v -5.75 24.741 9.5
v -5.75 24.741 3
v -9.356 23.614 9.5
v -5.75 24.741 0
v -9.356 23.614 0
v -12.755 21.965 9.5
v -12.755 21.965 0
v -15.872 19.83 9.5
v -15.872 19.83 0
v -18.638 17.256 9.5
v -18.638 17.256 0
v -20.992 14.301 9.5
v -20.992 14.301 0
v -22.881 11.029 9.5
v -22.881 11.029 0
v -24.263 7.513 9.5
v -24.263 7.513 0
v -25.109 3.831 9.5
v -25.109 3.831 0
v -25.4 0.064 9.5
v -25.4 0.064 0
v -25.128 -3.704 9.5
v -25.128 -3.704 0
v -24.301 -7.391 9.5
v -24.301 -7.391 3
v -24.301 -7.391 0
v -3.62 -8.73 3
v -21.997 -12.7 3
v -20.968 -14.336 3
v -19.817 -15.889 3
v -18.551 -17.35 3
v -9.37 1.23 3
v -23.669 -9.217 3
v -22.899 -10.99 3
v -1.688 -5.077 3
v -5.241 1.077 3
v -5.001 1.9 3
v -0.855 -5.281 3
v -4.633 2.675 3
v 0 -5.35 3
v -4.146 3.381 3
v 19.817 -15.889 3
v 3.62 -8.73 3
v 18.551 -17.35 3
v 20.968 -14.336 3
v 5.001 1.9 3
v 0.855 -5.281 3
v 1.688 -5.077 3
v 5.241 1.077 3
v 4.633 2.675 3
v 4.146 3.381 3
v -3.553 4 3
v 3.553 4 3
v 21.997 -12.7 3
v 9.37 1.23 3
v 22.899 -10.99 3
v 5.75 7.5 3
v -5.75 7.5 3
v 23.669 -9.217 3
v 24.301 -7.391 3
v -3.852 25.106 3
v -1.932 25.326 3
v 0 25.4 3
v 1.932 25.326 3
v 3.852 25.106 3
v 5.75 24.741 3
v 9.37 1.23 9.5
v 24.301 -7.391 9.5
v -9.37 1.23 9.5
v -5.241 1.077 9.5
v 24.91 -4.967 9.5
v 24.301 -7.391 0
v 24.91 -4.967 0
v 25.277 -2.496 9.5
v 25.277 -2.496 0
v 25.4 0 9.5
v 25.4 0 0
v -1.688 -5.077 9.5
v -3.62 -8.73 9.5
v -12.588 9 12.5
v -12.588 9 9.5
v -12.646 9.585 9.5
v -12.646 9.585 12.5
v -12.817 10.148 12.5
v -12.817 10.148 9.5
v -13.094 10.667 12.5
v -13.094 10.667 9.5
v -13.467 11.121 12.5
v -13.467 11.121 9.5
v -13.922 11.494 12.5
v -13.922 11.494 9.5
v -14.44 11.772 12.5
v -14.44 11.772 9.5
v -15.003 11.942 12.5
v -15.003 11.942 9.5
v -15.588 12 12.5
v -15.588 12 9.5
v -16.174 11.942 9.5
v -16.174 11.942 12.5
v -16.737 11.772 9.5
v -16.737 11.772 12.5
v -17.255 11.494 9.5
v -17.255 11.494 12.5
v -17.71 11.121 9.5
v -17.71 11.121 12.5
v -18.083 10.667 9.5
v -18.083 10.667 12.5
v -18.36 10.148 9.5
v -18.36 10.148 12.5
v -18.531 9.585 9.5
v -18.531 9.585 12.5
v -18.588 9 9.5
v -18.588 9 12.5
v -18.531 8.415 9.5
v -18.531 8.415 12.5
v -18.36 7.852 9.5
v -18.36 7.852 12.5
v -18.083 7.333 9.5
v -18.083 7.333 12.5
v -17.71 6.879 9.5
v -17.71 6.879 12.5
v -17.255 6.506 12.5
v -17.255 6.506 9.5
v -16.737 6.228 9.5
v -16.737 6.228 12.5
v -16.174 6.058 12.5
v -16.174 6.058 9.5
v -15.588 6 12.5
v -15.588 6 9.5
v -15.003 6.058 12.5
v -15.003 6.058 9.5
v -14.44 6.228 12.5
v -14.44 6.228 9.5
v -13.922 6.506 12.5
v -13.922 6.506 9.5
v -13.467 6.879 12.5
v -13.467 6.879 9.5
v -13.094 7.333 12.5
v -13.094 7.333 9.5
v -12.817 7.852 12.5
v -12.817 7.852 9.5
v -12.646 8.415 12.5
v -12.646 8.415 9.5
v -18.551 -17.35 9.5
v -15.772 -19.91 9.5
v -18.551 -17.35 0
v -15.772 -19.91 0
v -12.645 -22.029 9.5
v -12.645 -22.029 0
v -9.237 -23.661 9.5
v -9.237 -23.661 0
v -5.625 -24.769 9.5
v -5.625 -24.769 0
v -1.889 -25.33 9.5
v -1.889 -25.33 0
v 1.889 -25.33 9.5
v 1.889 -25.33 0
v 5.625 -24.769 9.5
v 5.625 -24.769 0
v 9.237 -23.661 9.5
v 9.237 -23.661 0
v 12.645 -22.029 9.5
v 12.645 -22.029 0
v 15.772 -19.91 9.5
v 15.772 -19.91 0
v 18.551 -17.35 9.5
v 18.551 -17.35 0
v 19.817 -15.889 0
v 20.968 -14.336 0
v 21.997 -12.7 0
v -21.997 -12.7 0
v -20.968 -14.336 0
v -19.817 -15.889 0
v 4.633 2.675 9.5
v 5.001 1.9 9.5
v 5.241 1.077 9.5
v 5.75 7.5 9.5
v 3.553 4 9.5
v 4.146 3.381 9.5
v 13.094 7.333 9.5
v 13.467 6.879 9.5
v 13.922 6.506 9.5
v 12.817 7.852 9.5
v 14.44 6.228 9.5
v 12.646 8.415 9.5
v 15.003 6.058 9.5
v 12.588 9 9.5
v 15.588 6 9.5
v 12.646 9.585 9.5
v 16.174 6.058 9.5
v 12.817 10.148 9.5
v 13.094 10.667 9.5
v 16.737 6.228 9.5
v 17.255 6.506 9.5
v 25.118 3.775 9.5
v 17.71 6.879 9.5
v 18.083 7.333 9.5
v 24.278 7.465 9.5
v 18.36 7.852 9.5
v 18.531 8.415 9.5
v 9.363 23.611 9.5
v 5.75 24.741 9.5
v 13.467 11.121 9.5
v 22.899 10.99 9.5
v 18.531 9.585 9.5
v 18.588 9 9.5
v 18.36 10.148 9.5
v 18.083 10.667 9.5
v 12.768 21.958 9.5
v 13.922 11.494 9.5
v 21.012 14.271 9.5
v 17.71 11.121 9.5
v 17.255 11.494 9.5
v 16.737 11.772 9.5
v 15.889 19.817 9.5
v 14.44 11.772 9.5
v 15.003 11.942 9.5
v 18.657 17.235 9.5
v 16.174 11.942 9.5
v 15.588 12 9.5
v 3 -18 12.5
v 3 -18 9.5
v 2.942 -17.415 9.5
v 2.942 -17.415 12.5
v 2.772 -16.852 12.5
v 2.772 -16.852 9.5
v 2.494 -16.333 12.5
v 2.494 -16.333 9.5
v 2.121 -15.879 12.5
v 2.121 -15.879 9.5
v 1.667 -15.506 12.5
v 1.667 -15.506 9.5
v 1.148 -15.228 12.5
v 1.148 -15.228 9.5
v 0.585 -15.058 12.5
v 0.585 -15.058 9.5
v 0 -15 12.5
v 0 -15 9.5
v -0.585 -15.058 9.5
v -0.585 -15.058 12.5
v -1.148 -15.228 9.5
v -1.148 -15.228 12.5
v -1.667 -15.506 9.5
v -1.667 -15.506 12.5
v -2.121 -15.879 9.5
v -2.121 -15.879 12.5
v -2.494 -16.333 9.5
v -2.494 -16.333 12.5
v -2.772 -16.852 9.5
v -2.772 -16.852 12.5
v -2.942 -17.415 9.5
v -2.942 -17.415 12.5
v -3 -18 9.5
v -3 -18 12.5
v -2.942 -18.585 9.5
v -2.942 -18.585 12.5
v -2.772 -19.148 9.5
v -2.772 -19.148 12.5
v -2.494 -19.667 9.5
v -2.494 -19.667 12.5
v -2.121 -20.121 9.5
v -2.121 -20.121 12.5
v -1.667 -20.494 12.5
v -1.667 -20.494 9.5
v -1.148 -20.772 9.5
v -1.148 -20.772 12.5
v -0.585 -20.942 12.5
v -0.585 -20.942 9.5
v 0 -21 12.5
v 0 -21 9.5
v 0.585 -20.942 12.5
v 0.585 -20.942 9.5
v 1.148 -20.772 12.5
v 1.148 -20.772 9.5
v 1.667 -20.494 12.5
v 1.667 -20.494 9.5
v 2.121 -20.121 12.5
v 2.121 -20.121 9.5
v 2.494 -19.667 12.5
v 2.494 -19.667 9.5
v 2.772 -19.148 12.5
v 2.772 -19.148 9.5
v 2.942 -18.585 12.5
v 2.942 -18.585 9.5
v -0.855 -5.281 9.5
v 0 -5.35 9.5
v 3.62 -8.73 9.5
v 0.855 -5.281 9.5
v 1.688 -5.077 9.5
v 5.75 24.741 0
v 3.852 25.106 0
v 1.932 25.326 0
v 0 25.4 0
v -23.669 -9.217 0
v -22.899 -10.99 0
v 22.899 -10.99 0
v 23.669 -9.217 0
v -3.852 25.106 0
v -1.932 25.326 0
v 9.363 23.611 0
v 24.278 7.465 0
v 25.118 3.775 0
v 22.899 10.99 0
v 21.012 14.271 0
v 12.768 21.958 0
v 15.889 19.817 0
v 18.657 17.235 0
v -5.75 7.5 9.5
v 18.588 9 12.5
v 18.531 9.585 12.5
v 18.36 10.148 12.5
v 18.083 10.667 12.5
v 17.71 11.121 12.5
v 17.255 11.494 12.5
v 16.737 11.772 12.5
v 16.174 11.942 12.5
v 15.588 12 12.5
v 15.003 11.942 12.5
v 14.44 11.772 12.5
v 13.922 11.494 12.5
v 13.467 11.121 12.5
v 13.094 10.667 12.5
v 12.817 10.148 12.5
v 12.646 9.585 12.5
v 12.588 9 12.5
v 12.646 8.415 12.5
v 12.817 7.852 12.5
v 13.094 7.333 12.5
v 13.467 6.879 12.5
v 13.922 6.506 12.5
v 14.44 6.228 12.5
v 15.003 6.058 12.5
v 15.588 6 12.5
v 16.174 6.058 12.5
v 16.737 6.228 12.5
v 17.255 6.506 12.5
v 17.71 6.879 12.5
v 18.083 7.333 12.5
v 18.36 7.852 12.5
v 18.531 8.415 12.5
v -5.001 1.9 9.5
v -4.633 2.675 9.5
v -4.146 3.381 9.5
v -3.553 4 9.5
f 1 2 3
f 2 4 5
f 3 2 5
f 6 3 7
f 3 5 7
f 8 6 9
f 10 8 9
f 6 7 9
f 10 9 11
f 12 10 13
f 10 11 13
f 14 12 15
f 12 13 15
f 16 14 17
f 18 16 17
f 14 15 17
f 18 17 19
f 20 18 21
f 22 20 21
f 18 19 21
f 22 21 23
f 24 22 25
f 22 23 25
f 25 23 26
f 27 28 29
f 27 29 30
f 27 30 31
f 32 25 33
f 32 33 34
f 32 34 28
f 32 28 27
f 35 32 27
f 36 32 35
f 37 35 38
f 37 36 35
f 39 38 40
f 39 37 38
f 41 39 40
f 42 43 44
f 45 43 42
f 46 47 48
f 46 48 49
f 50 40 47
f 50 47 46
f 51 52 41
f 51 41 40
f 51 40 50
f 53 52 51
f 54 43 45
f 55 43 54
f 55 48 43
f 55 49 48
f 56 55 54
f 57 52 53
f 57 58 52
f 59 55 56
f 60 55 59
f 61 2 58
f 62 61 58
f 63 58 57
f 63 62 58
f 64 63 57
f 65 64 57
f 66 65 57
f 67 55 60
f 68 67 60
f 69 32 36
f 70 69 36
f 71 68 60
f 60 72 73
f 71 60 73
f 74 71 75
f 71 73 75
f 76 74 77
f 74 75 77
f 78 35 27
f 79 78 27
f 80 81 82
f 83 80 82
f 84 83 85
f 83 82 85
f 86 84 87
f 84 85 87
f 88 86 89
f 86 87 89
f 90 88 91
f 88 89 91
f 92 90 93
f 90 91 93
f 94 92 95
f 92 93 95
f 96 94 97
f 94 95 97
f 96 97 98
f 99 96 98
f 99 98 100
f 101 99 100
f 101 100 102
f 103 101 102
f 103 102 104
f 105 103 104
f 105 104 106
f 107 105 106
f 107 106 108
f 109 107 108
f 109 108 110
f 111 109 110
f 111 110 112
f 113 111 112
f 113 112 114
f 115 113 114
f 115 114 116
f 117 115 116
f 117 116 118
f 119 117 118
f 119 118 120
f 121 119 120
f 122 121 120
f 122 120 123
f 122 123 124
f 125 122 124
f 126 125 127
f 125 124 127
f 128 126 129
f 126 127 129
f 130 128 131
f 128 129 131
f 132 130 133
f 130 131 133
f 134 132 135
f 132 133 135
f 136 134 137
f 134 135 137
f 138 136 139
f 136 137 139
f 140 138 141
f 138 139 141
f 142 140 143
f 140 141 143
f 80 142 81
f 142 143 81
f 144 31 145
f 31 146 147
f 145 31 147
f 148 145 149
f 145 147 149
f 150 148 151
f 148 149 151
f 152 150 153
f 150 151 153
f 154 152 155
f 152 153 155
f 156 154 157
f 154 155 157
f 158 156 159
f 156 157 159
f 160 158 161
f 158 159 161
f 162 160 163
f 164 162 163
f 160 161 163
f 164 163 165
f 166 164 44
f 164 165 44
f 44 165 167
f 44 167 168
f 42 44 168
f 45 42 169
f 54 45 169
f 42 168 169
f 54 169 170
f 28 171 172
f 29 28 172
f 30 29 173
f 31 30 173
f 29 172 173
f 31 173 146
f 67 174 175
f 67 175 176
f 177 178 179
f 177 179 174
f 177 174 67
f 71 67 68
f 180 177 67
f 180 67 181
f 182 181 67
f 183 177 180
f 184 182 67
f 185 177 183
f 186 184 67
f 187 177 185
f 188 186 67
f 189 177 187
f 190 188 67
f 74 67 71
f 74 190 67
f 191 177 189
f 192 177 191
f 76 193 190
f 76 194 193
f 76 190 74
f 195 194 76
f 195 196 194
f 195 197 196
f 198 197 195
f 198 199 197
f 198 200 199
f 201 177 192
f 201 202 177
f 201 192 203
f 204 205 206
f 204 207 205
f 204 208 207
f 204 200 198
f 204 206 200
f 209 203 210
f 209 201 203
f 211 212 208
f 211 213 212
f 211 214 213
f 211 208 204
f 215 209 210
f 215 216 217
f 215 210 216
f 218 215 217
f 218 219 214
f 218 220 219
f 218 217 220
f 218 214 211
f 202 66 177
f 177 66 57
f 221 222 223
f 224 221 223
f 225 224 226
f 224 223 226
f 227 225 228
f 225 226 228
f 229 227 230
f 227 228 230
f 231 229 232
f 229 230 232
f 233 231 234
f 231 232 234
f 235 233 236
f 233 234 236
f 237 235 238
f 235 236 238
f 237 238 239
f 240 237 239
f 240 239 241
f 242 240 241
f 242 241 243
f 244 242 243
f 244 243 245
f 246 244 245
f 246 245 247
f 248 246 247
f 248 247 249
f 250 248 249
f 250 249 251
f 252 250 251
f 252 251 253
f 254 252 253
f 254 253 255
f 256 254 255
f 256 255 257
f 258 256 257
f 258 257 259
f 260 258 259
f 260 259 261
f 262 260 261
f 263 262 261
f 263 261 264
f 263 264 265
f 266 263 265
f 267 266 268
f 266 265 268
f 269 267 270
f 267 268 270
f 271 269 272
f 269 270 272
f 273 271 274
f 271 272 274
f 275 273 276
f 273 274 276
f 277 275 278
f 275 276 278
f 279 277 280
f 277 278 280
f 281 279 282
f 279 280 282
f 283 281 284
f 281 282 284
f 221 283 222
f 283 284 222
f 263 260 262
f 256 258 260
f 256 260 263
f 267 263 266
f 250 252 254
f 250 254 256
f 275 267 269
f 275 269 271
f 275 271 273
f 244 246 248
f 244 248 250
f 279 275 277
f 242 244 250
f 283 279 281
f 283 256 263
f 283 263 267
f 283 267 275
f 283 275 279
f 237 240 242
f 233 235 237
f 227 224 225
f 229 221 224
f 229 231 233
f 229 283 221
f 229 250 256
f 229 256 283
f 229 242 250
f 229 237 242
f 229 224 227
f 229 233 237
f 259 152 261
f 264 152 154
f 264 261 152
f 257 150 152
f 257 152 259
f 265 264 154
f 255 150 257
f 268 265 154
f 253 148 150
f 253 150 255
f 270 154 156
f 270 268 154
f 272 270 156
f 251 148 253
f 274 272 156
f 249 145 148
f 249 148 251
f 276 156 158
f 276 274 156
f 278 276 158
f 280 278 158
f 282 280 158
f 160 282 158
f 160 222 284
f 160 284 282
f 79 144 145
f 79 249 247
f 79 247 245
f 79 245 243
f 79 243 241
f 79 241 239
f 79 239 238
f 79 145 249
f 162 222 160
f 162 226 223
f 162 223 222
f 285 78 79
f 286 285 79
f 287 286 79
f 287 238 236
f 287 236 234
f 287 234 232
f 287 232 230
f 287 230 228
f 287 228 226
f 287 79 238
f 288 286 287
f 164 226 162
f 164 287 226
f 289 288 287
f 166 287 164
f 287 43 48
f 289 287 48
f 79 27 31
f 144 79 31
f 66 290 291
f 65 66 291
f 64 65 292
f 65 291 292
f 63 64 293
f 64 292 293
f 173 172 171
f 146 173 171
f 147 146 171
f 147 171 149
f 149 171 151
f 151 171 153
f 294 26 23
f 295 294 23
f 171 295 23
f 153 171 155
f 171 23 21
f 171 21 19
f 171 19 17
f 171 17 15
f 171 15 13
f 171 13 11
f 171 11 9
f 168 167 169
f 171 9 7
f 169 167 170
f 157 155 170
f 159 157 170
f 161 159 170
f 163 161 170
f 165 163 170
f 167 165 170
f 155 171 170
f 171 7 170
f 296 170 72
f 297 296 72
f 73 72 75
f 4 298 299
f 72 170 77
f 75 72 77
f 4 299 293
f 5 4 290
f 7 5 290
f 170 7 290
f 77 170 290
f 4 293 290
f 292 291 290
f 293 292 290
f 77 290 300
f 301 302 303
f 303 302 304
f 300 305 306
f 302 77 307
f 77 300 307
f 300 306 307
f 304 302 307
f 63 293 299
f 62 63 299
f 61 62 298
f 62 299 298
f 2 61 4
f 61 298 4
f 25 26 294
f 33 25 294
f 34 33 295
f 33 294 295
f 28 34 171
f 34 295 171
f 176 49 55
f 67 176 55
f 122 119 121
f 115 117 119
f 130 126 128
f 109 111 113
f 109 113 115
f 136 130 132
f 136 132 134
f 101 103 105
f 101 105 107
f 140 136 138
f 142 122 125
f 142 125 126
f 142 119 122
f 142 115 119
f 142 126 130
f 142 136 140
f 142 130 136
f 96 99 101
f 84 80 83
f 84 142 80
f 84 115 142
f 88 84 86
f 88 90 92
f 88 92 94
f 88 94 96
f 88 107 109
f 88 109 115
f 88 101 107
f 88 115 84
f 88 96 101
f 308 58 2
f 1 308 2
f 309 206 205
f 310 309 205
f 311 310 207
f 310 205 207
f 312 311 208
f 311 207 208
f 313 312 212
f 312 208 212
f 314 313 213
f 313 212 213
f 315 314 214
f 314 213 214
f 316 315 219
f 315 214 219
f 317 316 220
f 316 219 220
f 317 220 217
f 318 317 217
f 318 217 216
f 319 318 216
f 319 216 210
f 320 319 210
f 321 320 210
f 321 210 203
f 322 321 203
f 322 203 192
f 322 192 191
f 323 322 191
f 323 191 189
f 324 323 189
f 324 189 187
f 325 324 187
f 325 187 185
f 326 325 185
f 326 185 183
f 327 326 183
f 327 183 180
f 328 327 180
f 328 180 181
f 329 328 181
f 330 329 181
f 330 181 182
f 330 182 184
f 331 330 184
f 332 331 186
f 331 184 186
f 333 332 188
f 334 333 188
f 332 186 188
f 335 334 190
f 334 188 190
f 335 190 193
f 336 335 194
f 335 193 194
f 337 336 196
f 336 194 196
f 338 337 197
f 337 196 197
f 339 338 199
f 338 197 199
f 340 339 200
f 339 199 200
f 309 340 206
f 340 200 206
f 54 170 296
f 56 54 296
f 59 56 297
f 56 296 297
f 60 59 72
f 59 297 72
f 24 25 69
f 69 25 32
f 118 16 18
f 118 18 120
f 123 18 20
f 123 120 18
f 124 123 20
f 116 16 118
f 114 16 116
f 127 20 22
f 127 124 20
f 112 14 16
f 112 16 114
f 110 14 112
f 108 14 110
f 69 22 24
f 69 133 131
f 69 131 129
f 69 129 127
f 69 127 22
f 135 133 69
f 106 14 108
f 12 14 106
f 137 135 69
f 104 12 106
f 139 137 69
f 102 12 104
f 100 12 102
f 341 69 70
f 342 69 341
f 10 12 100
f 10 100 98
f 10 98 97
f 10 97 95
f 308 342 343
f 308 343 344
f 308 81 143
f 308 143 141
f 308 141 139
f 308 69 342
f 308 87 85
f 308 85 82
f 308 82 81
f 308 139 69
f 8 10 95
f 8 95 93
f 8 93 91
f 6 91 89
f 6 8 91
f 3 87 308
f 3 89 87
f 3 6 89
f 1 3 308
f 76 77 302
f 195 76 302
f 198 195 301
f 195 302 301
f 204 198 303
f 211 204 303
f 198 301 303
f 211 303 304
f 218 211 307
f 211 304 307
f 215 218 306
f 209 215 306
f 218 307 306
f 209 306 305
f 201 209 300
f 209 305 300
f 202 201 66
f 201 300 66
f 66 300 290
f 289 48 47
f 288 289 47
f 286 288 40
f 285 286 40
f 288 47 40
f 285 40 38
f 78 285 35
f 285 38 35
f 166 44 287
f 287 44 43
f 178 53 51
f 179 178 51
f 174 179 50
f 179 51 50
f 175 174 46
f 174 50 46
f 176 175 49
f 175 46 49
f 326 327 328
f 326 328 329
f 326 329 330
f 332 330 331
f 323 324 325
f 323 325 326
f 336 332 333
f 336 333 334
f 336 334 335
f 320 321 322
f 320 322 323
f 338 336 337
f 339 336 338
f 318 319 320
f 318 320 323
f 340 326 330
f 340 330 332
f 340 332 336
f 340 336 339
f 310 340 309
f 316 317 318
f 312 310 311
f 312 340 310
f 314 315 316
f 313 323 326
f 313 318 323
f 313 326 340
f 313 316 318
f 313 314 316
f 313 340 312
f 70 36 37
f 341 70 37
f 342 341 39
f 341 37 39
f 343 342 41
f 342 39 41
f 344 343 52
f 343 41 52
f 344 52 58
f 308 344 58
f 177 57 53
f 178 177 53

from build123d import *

# Parameters (mm, degrees)
F0_R     = 3
F1_DEPTH = 3
F2_DEPTH = 9.5
F3_DEPTH = 12.5


with BuildPart() as f1:
    # F0 (on Top) → F1 (new body)
    with BuildSketch(Plane.XY):
        with BuildLine():
            ThreePointArc((3.552816, 4), (4.633236, 2.675), (5.24051, 1.076829))
            Line((5.24051, 1.076829), (9.370191, 1.229646))
            Line((9.370191, 1.229646), (24.300992, -7.390656))
            ThreePointArc((24.300992, -7.390656), (25.123746, -3.735961), (25.4, 0))
            ThreePointArc((25.4, 0), (19.889822, 15.79731), (5.75, 24.740604))
            Line((5.75, 24.740604), (5.75, 7.5))
            Line((5.75, 7.5), (3.552816, 4))
        make_face()
        with Locations((15.588457, 9)):
            Circle(F0_R, mode=Mode.SUBTRACT)
        with Locations((15.588457, 9)):
            Circle(F0_R)
        with BuildLine():
            ThreePointArc((-3.552816, 4), (0, 5.35), (3.552816, 4))
            Line((3.552816, 4), (5.75, 7.5))
            Line((5.75, 7.5), (5.75, 24.740604))
            ThreePointArc((5.75, 24.740604), (2.893843, 25.234613), (0, 25.4))
            ThreePointArc((0, 25.4), (-2.893843, 25.234613), (-5.75, 24.740604))
            Line((-5.75, 24.740604), (-5.75, 7.5))
            Line((-5.75, 7.5), (-3.552816, 4))
        make_face()
        with BuildLine():
            ThreePointArc((-5.24051, 1.076829), (-4.633236, 2.675), (-3.552816, 4))
            Line((-3.552816, 4), (-5.75, 7.5))
            Line((-5.75, 7.5), (-5.75, 24.740604))
            ThreePointArc((-5.75, 24.740604), (-21.997045, 12.7), (-24.300992, -7.390656))
            Line((-24.300992, -7.390656), (-9.370191, 1.229646))
            Line((-9.370191, 1.229646), (-5.24051, 1.076829))
        make_face()
        with Locations((-15.588457, 9)):
            Circle(F0_R, mode=Mode.SUBTRACT)
        with Locations((-15.588457, 9)):
            Circle(F0_R)
        with BuildLine():
            Line((-3.620191, -8.729646), (-1.687694, -5.076829))
            ThreePointArc((-1.687694, -5.076829), (-4.633236, -2.675), (-5.24051, 1.076829))
            Line((-5.24051, 1.076829), (-9.370191, 1.229646))
            Line((-9.370191, 1.229646), (-24.300992, -7.390656))
            ThreePointArc((-24.300992, -7.390656), (-23.300737, -10.111165), (-21.997045, -12.7))
            ThreePointArc((-21.997045, -12.7), (-20.406894, -15.123448), (-18.550992, -17.349948))
            Line((-18.550992, -17.349948), (-3.620191, -8.729646))
        make_face()
        with BuildLine():
            ThreePointArc((1.687694, -5.076829), (4.338874, -3.129963), (5.35, 0))
            ThreePointArc((5.35, 0), (5.322557, 0.54119), (5.24051, 1.076829))
            ThreePointArc((5.24051, 1.076829), (4.633236, 2.675), (3.552816, 4))
            ThreePointArc((3.552816, 4), (0, 5.35), (-3.552816, 4))
            ThreePointArc((-3.552816, 4), (-4.633236, 2.675), (-5.24051, 1.076829))
            ThreePointArc((-5.24051, 1.076829), (-4.633236, -2.675), (-1.687694, -5.076829))
            ThreePointArc((-1.687694, -5.076829), (0, -5.35), (1.687694, -5.076829))
        make_face()
        with BuildLine():
            ThreePointArc((5.24051, 1.076829), (5.322557, 0.54119), (5.35, 0))
            ThreePointArc((5.35, 0), (4.338874, -3.129963), (1.687694, -5.076829))
            Line((1.687694, -5.076829), (3.620191, -8.729646))
            Line((3.620191, -8.729646), (18.550992, -17.349948))
            ThreePointArc((18.550992, -17.349948), (20.406894, -15.123448), (21.997045, -12.7))
            ThreePointArc((21.997045, -12.7), (23.300737, -10.111165), (24.300992, -7.390656))
            Line((24.300992, -7.390656), (9.370191, 1.229646))
            Line((9.370191, 1.229646), (5.24051, 1.076829))
        make_face()
        with BuildLine():
            Line((3.620191, -8.729646), (1.687694, -5.076829))
            ThreePointArc((1.687694, -5.076829), (0, -5.35), (-1.687694, -5.076829))
            Line((-1.687694, -5.076829), (-3.620191, -8.729646))
            Line((-3.620191, -8.729646), (-18.550992, -17.349948))
            ThreePointArc((-18.550992, -17.349948), (0, -25.4), (18.550992, -17.349948))
            Line((18.550992, -17.349948), (3.620191, -8.729646))
        make_face()
        with Locations((0, -18)):
            Circle(F0_R, mode=Mode.SUBTRACT)
        with Locations((0, -18)):
            Circle(F0_R)
    extrude(amount=F1_DEPTH)

    # F0 (on Top) → F2 (join)
    with BuildSketch(Plane.XY):
        with BuildLine():
            ThreePointArc((-5.24051, 1.076829), (-4.633236, 2.675), (-3.552816, 4))
            Line((-3.552816, 4), (-5.75, 7.5))
            Line((-5.75, 7.5), (-5.75, 24.740604))
            ThreePointArc((-5.75, 24.740604), (-21.997045, 12.7), (-24.300992, -7.390656))
            Line((-24.300992, -7.390656), (-9.370191, 1.229646))
            Line((-9.370191, 1.229646), (-5.24051, 1.076829))
        make_face()
        with Locations((-15.588457, 9)):
            Circle(F0_R, mode=Mode.SUBTRACT)
        with Locations((-15.588457, 9)):
            Circle(F0_R)
        with Locations((15.588457, 9)):
            Circle(F0_R)
        with BuildLine():
            ThreePointArc((3.552816, 4), (4.633236, 2.675), (5.24051, 1.076829))
            Line((5.24051, 1.076829), (9.370191, 1.229646))
            Line((9.370191, 1.229646), (24.300992, -7.390656))
            ThreePointArc((24.300992, -7.390656), (25.123746, -3.735961), (25.4, 0))
            ThreePointArc((25.4, 0), (19.889822, 15.79731), (5.75, 24.740604))
            Line((5.75, 24.740604), (5.75, 7.5))
            Line((5.75, 7.5), (3.552816, 4))
        make_face()
        with Locations((15.588457, 9)):
            Circle(F0_R, mode=Mode.SUBTRACT)
        with BuildLine():
            Line((3.620191, -8.729646), (1.687694, -5.076829))
            ThreePointArc((1.687694, -5.076829), (0, -5.35), (-1.687694, -5.076829))
            Line((-1.687694, -5.076829), (-3.620191, -8.729646))
            Line((-3.620191, -8.729646), (-18.550992, -17.349948))
            ThreePointArc((-18.550992, -17.349948), (0, -25.4), (18.550992, -17.349948))
            Line((18.550992, -17.349948), (3.620191, -8.729646))
        make_face()
        with Locations((0, -18)):
            Circle(F0_R, mode=Mode.SUBTRACT)
        with Locations((0, -18)):
            Circle(F0_R)
    extrude(amount=F2_DEPTH)

    # F0 (on Top) → F3 (join)
    with BuildSketch(Plane.XY):
        with Locations((-15.588457, 9)):
            Circle(F0_R)
        with Locations((0, -18)):
            Circle(F0_R)
        with Locations((15.588457, 9)):
            Circle(F0_R)
    extrude(amount=F3_DEPTH)


solid = f1.part
